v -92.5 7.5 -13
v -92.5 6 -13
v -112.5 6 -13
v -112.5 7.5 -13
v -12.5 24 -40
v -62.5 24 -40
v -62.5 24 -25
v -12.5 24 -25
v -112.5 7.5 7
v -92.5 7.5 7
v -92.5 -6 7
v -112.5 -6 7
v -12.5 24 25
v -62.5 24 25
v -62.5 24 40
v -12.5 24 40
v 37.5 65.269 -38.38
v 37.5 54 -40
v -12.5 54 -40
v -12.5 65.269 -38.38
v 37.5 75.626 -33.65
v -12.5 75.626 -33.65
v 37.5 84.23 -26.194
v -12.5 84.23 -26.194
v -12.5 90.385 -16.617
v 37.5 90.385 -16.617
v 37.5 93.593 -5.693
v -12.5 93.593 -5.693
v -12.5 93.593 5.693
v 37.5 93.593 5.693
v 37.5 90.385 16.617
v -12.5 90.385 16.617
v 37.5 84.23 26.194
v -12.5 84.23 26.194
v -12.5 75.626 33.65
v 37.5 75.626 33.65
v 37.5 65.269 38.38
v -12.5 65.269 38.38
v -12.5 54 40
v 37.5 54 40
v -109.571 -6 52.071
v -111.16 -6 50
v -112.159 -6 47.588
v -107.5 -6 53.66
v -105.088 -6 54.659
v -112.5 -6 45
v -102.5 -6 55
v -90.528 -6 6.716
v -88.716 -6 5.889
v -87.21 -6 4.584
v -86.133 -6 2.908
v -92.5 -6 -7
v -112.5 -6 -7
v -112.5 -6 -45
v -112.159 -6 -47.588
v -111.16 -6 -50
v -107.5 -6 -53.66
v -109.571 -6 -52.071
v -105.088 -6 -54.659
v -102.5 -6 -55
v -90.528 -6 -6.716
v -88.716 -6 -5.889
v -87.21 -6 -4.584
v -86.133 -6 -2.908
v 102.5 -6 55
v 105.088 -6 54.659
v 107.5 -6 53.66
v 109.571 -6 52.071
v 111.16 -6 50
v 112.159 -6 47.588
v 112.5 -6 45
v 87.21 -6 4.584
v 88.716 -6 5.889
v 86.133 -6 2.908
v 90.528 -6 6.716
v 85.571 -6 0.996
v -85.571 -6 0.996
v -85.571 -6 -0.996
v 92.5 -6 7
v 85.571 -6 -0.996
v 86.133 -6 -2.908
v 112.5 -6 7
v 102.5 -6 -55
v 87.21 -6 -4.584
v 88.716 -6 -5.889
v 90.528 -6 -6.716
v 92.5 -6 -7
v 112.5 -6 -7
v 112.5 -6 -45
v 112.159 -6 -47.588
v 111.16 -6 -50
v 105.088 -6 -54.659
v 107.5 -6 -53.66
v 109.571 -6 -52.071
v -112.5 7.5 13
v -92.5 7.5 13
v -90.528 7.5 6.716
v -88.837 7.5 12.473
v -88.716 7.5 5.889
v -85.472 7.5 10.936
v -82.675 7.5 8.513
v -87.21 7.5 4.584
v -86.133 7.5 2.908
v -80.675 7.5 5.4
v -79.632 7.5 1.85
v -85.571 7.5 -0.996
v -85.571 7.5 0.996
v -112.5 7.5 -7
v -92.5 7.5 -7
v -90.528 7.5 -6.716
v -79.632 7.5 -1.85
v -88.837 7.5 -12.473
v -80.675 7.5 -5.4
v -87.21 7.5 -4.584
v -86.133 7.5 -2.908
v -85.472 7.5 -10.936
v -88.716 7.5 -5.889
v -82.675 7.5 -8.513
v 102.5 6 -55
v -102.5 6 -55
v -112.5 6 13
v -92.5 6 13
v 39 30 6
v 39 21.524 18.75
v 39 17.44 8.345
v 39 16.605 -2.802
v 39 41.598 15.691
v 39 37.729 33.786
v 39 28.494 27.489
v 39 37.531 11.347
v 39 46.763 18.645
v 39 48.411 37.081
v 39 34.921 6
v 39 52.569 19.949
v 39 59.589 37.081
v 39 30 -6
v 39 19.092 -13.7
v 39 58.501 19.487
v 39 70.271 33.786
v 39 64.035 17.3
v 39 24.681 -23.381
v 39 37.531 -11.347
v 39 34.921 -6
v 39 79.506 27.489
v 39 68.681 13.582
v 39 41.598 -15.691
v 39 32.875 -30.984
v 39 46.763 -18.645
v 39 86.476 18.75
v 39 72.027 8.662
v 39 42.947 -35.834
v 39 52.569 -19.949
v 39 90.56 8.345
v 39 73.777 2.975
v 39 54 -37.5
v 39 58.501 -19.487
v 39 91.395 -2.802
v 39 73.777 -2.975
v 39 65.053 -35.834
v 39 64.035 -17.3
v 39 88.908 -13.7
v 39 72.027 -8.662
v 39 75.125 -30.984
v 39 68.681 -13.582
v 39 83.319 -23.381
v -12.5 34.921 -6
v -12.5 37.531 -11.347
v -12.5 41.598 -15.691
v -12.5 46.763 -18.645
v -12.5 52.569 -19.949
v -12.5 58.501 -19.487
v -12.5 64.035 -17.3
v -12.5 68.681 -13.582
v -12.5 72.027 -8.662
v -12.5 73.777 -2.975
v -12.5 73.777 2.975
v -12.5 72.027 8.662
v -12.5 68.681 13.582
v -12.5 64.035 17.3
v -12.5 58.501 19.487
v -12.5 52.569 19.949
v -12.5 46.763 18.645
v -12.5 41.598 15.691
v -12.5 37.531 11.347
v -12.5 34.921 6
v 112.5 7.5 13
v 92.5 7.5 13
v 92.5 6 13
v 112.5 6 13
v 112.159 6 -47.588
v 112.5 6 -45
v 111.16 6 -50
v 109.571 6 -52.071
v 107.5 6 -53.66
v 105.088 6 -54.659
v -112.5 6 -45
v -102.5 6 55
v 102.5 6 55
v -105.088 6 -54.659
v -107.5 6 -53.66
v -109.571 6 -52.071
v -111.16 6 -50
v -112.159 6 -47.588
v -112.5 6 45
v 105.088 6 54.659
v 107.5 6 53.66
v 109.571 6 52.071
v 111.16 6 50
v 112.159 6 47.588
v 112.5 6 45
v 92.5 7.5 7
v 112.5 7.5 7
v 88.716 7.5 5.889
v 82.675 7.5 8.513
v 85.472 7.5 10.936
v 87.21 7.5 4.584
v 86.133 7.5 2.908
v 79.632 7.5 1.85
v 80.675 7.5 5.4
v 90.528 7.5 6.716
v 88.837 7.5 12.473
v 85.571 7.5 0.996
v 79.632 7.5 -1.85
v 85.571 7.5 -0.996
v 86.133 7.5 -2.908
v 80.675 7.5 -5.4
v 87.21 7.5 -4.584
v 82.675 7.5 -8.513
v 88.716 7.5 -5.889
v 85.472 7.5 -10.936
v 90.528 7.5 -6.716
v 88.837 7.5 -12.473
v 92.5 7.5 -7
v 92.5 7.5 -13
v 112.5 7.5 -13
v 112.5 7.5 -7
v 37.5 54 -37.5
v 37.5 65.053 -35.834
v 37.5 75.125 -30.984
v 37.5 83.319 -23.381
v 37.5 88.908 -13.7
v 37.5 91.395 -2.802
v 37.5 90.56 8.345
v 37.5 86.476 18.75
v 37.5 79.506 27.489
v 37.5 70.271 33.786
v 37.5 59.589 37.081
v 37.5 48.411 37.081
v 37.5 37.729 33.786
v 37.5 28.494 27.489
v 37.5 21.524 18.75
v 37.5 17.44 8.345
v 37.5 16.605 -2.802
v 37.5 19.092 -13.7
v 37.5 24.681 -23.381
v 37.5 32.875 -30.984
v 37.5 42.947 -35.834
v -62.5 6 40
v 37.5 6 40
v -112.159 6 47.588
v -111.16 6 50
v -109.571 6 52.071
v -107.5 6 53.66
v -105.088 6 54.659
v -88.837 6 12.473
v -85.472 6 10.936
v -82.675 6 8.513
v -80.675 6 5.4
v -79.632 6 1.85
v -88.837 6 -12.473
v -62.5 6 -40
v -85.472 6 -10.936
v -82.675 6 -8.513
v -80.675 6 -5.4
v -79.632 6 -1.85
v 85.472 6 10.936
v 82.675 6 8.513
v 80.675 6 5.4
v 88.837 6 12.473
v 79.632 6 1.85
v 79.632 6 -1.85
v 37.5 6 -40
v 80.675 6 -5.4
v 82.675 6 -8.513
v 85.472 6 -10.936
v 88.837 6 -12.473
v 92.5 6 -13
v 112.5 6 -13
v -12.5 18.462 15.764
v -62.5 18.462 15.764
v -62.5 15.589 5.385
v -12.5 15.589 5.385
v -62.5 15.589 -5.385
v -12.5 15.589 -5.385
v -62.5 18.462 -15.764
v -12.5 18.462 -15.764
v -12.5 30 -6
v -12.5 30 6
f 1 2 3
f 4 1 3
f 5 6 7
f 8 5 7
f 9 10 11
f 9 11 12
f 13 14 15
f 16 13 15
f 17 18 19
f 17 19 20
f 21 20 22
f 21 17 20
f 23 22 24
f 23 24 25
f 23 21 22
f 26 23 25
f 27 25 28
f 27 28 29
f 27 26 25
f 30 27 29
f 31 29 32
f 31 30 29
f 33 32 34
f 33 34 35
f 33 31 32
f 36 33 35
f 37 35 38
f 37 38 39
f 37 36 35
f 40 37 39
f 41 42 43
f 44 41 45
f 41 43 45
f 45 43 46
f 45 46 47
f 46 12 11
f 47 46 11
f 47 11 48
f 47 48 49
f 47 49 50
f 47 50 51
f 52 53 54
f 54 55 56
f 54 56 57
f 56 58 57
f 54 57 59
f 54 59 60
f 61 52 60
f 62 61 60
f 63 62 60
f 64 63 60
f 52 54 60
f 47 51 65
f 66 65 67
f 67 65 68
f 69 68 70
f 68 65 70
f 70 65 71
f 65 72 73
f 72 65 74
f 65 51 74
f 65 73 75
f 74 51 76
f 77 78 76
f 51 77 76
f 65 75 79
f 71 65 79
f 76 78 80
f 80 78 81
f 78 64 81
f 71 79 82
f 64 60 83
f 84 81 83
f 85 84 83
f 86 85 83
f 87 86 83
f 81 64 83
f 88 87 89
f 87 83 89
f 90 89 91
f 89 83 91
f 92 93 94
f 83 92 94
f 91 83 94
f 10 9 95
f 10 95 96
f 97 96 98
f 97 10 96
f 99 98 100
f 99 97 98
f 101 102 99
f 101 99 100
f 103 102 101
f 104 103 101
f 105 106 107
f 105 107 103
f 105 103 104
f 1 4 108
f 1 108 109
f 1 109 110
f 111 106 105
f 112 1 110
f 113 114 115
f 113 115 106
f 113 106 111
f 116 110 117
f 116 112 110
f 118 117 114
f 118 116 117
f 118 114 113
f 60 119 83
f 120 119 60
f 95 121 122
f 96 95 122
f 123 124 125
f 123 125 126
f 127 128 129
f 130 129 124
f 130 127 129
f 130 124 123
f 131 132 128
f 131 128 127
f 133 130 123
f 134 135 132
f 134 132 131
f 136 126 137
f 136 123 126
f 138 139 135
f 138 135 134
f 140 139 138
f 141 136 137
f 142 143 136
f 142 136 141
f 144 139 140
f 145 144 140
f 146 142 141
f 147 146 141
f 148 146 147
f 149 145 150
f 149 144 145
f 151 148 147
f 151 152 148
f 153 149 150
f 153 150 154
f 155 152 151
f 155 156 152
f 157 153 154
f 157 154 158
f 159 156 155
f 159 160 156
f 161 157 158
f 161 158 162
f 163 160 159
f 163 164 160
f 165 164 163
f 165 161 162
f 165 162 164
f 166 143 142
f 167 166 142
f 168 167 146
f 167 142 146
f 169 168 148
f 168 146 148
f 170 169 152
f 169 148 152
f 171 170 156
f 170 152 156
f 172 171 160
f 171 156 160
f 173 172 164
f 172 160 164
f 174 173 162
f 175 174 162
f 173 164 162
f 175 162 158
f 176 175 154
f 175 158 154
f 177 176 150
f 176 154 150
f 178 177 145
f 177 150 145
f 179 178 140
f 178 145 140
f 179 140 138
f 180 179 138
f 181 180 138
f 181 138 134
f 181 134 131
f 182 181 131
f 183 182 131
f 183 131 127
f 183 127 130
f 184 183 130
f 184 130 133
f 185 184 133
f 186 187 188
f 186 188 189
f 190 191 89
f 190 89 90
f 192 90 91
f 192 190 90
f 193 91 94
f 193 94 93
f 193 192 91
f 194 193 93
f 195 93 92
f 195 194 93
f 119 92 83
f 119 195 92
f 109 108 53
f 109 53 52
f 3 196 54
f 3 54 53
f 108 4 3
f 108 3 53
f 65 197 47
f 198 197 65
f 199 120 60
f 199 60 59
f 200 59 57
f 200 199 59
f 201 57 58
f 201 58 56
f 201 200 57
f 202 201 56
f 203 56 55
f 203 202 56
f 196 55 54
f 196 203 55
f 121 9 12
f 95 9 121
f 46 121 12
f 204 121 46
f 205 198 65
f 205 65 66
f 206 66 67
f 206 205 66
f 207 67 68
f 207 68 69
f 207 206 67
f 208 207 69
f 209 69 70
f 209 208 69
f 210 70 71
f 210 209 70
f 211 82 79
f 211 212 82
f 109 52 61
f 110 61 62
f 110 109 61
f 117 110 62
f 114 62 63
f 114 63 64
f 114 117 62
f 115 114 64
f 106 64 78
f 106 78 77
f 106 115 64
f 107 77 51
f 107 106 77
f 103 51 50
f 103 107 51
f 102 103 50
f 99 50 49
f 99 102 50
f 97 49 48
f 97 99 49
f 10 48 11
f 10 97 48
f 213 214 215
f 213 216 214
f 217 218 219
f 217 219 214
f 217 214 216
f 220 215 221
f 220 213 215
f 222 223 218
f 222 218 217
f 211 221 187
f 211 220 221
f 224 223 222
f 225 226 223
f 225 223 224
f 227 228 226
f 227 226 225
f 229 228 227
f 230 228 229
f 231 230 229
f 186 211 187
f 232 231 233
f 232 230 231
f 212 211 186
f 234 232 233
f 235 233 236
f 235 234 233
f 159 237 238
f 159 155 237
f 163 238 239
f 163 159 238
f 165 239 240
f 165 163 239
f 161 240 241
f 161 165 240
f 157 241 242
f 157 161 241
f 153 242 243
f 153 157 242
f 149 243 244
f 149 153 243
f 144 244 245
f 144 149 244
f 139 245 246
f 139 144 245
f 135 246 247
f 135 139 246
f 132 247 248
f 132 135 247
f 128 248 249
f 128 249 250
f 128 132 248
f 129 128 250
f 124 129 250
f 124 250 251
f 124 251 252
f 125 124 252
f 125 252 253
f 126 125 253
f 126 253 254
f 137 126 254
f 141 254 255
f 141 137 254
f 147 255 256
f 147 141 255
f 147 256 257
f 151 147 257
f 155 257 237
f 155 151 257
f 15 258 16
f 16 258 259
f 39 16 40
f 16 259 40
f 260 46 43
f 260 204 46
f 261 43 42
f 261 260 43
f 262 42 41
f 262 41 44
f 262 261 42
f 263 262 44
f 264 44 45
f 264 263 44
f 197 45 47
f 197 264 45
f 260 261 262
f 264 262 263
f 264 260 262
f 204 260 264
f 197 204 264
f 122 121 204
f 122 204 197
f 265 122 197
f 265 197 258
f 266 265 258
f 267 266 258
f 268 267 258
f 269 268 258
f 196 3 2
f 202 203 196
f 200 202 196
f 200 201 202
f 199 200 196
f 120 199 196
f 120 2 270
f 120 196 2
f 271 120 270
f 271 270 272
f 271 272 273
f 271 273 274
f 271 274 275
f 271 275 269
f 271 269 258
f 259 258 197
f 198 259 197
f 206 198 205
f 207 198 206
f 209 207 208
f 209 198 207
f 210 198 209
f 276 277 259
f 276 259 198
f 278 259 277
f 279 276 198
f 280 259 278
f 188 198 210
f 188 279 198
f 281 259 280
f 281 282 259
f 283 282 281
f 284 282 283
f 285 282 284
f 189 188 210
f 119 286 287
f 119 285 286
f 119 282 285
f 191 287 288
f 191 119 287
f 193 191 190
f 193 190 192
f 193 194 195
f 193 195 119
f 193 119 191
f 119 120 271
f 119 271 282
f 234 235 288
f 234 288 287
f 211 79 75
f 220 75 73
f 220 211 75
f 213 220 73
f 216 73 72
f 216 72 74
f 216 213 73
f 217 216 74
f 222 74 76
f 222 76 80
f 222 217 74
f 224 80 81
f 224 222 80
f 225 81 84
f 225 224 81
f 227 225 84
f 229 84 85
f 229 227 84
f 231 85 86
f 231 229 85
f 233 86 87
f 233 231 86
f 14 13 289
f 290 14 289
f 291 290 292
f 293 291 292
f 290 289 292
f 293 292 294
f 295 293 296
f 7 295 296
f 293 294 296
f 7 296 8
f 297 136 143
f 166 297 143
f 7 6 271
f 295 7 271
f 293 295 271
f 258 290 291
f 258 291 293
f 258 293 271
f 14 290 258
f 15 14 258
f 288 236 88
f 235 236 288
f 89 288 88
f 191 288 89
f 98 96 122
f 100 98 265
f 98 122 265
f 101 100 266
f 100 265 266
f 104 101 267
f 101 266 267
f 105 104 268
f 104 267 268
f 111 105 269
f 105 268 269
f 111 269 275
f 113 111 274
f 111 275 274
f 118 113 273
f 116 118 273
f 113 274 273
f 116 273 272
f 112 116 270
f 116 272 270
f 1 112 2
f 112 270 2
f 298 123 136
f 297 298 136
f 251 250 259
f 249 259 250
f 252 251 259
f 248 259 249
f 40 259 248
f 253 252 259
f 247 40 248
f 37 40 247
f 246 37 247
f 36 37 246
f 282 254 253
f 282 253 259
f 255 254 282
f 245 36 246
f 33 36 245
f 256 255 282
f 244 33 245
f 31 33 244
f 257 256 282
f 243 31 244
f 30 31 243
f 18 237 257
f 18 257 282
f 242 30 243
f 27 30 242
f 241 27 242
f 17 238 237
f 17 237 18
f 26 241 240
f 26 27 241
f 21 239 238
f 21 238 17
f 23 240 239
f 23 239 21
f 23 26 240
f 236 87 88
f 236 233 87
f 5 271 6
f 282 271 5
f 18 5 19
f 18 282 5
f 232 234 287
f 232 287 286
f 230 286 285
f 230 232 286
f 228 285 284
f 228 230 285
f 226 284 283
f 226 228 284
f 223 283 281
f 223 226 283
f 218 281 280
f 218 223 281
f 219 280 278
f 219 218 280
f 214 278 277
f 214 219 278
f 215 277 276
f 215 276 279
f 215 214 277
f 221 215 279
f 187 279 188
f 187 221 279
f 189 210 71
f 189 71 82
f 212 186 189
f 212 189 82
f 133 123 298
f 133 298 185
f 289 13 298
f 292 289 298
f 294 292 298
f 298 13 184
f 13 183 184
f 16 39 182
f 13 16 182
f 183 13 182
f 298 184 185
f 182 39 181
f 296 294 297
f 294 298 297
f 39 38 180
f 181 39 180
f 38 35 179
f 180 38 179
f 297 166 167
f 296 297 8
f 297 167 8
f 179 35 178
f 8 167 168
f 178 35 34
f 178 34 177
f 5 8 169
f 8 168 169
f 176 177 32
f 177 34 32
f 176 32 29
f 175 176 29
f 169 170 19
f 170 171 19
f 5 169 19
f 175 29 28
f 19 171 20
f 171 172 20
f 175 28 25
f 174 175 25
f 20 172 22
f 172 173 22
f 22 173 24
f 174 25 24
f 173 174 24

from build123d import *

# Parameters (mm, degrees)
EXTRUDE_1_DEPTH     = 6
EXTRUDE_2_DEPTH     = 1.5
EXTRUDE_START       = -100
EXTRUDE_3_DEPTH     = 25
SKETCH_4_R          = 37.5
EXTRUDE_4_DEPTH     = 1.5
SKETCH_5_R          = 20
SKETCH_5_W          = 12
SKETCH_5_H          = 8
CUT_EXTRUDE_1_DEPTH = 187.58309141
SKETCH_6_W          = 50
SKETCH_6_H          = 80
EXTRUDE_5_DEPTH     = 1.5
SKETCH_7_W          = 15
SKETCH_7_H          = 16.5
EXTRUDE_6_DEPTH     = 50


with BuildPart() as part:
    # 草图1 → 凸台-拉伸1 (new, symmetric)
    with BuildSketch(Plane(origin=(0, 0, 0), x_dir=(1, 0, 0), z_dir=(0, 1, 0))):
        with BuildLine():
            ThreePointArc((-112.5, -45), (-109.571067812, -52.071067812), (-102.5, -55))
            Line((-102.5, -55), (102.5, -55))
            ThreePointArc((102.5, -55), (109.571067812, -52.071067812), (112.5, -45))
            Line((112.5, -45), (112.5, -7))
            Line((112.5, -7), (92.5, -7))
            ThreePointArc((92.5, -7), (85.5, 0), (92.5, 7))
            Line((92.5, 7), (112.5, 7))
            Line((112.5, 7), (112.5, 45))
            ThreePointArc((112.5, 45), (109.571067812, 52.071067812), (102.5, 55))
            Line((102.5, 55), (-102.5, 55))
            ThreePointArc((-102.5, 55), (-109.571067812, 52.071067812), (-112.5, 45))
            Line((-112.5, 45), (-112.5, 7))
            Line((-112.5, 7), (-92.5, 7))
            ThreePointArc((-92.5, 7), (-85.5, 0), (-92.5, -7))
            Line((-92.5, -7), (-112.5, -7))
            Line((-112.5, -7), (-112.5, -45))
        make_face()
    extrude(amount=EXTRUDE_1_DEPTH, both=True)

    # 草图2 → 凸台-拉伸2 (add, symmetric)
    with BuildSketch(Plane(origin=(0, 6, 0), x_dir=(1, 0, 0), z_dir=(0, 1, 0))):
        with BuildLine():
            Line((-92.5, 13), (-112.5, 13))
            Line((-112.5, 13), (-112.5, 7))
            Line((-112.5, 7), (-92.5, 7))
            ThreePointArc((-92.5, 7), (-85.5, 0), (-92.5, -7))
            Line((-92.5, -7), (-112.5, -7))
            Line((-112.5, -7), (-112.5, -13))
            Line((-112.5, -13), (-92.5, -13))
            ThreePointArc((-92.5, -13), (-79.5, 0), (-92.5, 13))
        make_face()
        with BuildLine():
            Line((112.5, 7), (112.5, 13))
            Line((112.5, 13), (92.5, 13))
            ThreePointArc((92.5, 13), (79.5, 0), (92.5, -13))
            Line((92.5, -13), (112.5, -13))
            Line((112.5, -13), (112.5, -7))
            Line((112.5, -7), (92.5, -7))
            ThreePointArc((92.5, -7), (85.5, 0), (92.5, 7))
            Line((92.5, 7), (112.5, 7))
        make_face()
    extrude(amount=EXTRUDE_2_DEPTH, both=True)

    # 草图3 → 凸台-拉伸3 (add, symmetric)
    with BuildSketch(Plane(origin=(112.5, 0, 0), x_dir=(0, 0, -1), z_dir=(1, 0, 0)).offset(EXTRUDE_START)):
        with BuildLine():
            Line((-40, 6), (40, 6))
            Line((40, 6), (40, 54))
            ThreePointArc((40, 54), (0, 94), (-40, 54))
            Line((-40, 54), (-40, 6))
        make_face()
    extrude(amount=EXTRUDE_3_DEPTH, both=True)

    # 草图4 → 凸台-拉伸4 (add, symmetric)
    with BuildSketch(Plane(origin=(37.5, 0, 0), x_dir=(0, 0, -1), z_dir=(1, 0, 0))):
        with Locations((0, 54)):
            Circle(SKETCH_4_R)
    extrude(amount=EXTRUDE_4_DEPTH, both=True)

    # 草图5 → 切除-拉伸1 (cut, through all)
    with BuildSketch(Plane(origin=(39, 0, 0), x_dir=(0, 0, -1), z_dir=(1, 0, 0))):
        with Locations((0, 54)):
            Circle(SKETCH_5_R)
        with Locations((0, 34)):
            Rectangle(SKETCH_5_W, SKETCH_5_H)
    extrude(amount=-CUT_EXTRUDE_1_DEPTH, mode=Mode.SUBTRACT)

    # 草图6 → 凸台-拉伸5 (add, symmetric)
    with BuildSketch(Plane(origin=(0, 6, 0), x_dir=(1, 0, 0), z_dir=(0, 1, 0))):
        with Locations((-37.5, 0)):
            Rectangle(SKETCH_6_W, SKETCH_6_H)
    extrude(amount=EXTRUDE_5_DEPTH, both=True)

    # 草图7 → 凸台-拉伸6 (add)
    with BuildSketch(Plane.ZY.offset(12.5)):
        with BuildLine():
            Line((-25, 24), (-25, 7.5))
            Line((-25, 7.5), (25, 7.5))
            Line((25, 7.5), (25, 24))
            ThreePointArc((25, 24), (0, 15.224989992), (-25, 24))
        make_face()
        with Locations((-32.5, 15.75)):
            Rectangle(SKETCH_7_W, SKETCH_7_H)
        with Locations((32.5, 15.75)):
            Rectangle(SKETCH_7_W, SKETCH_7_H)
    extrude(amount=EXTRUDE_6_DEPTH)


solid = part.part
